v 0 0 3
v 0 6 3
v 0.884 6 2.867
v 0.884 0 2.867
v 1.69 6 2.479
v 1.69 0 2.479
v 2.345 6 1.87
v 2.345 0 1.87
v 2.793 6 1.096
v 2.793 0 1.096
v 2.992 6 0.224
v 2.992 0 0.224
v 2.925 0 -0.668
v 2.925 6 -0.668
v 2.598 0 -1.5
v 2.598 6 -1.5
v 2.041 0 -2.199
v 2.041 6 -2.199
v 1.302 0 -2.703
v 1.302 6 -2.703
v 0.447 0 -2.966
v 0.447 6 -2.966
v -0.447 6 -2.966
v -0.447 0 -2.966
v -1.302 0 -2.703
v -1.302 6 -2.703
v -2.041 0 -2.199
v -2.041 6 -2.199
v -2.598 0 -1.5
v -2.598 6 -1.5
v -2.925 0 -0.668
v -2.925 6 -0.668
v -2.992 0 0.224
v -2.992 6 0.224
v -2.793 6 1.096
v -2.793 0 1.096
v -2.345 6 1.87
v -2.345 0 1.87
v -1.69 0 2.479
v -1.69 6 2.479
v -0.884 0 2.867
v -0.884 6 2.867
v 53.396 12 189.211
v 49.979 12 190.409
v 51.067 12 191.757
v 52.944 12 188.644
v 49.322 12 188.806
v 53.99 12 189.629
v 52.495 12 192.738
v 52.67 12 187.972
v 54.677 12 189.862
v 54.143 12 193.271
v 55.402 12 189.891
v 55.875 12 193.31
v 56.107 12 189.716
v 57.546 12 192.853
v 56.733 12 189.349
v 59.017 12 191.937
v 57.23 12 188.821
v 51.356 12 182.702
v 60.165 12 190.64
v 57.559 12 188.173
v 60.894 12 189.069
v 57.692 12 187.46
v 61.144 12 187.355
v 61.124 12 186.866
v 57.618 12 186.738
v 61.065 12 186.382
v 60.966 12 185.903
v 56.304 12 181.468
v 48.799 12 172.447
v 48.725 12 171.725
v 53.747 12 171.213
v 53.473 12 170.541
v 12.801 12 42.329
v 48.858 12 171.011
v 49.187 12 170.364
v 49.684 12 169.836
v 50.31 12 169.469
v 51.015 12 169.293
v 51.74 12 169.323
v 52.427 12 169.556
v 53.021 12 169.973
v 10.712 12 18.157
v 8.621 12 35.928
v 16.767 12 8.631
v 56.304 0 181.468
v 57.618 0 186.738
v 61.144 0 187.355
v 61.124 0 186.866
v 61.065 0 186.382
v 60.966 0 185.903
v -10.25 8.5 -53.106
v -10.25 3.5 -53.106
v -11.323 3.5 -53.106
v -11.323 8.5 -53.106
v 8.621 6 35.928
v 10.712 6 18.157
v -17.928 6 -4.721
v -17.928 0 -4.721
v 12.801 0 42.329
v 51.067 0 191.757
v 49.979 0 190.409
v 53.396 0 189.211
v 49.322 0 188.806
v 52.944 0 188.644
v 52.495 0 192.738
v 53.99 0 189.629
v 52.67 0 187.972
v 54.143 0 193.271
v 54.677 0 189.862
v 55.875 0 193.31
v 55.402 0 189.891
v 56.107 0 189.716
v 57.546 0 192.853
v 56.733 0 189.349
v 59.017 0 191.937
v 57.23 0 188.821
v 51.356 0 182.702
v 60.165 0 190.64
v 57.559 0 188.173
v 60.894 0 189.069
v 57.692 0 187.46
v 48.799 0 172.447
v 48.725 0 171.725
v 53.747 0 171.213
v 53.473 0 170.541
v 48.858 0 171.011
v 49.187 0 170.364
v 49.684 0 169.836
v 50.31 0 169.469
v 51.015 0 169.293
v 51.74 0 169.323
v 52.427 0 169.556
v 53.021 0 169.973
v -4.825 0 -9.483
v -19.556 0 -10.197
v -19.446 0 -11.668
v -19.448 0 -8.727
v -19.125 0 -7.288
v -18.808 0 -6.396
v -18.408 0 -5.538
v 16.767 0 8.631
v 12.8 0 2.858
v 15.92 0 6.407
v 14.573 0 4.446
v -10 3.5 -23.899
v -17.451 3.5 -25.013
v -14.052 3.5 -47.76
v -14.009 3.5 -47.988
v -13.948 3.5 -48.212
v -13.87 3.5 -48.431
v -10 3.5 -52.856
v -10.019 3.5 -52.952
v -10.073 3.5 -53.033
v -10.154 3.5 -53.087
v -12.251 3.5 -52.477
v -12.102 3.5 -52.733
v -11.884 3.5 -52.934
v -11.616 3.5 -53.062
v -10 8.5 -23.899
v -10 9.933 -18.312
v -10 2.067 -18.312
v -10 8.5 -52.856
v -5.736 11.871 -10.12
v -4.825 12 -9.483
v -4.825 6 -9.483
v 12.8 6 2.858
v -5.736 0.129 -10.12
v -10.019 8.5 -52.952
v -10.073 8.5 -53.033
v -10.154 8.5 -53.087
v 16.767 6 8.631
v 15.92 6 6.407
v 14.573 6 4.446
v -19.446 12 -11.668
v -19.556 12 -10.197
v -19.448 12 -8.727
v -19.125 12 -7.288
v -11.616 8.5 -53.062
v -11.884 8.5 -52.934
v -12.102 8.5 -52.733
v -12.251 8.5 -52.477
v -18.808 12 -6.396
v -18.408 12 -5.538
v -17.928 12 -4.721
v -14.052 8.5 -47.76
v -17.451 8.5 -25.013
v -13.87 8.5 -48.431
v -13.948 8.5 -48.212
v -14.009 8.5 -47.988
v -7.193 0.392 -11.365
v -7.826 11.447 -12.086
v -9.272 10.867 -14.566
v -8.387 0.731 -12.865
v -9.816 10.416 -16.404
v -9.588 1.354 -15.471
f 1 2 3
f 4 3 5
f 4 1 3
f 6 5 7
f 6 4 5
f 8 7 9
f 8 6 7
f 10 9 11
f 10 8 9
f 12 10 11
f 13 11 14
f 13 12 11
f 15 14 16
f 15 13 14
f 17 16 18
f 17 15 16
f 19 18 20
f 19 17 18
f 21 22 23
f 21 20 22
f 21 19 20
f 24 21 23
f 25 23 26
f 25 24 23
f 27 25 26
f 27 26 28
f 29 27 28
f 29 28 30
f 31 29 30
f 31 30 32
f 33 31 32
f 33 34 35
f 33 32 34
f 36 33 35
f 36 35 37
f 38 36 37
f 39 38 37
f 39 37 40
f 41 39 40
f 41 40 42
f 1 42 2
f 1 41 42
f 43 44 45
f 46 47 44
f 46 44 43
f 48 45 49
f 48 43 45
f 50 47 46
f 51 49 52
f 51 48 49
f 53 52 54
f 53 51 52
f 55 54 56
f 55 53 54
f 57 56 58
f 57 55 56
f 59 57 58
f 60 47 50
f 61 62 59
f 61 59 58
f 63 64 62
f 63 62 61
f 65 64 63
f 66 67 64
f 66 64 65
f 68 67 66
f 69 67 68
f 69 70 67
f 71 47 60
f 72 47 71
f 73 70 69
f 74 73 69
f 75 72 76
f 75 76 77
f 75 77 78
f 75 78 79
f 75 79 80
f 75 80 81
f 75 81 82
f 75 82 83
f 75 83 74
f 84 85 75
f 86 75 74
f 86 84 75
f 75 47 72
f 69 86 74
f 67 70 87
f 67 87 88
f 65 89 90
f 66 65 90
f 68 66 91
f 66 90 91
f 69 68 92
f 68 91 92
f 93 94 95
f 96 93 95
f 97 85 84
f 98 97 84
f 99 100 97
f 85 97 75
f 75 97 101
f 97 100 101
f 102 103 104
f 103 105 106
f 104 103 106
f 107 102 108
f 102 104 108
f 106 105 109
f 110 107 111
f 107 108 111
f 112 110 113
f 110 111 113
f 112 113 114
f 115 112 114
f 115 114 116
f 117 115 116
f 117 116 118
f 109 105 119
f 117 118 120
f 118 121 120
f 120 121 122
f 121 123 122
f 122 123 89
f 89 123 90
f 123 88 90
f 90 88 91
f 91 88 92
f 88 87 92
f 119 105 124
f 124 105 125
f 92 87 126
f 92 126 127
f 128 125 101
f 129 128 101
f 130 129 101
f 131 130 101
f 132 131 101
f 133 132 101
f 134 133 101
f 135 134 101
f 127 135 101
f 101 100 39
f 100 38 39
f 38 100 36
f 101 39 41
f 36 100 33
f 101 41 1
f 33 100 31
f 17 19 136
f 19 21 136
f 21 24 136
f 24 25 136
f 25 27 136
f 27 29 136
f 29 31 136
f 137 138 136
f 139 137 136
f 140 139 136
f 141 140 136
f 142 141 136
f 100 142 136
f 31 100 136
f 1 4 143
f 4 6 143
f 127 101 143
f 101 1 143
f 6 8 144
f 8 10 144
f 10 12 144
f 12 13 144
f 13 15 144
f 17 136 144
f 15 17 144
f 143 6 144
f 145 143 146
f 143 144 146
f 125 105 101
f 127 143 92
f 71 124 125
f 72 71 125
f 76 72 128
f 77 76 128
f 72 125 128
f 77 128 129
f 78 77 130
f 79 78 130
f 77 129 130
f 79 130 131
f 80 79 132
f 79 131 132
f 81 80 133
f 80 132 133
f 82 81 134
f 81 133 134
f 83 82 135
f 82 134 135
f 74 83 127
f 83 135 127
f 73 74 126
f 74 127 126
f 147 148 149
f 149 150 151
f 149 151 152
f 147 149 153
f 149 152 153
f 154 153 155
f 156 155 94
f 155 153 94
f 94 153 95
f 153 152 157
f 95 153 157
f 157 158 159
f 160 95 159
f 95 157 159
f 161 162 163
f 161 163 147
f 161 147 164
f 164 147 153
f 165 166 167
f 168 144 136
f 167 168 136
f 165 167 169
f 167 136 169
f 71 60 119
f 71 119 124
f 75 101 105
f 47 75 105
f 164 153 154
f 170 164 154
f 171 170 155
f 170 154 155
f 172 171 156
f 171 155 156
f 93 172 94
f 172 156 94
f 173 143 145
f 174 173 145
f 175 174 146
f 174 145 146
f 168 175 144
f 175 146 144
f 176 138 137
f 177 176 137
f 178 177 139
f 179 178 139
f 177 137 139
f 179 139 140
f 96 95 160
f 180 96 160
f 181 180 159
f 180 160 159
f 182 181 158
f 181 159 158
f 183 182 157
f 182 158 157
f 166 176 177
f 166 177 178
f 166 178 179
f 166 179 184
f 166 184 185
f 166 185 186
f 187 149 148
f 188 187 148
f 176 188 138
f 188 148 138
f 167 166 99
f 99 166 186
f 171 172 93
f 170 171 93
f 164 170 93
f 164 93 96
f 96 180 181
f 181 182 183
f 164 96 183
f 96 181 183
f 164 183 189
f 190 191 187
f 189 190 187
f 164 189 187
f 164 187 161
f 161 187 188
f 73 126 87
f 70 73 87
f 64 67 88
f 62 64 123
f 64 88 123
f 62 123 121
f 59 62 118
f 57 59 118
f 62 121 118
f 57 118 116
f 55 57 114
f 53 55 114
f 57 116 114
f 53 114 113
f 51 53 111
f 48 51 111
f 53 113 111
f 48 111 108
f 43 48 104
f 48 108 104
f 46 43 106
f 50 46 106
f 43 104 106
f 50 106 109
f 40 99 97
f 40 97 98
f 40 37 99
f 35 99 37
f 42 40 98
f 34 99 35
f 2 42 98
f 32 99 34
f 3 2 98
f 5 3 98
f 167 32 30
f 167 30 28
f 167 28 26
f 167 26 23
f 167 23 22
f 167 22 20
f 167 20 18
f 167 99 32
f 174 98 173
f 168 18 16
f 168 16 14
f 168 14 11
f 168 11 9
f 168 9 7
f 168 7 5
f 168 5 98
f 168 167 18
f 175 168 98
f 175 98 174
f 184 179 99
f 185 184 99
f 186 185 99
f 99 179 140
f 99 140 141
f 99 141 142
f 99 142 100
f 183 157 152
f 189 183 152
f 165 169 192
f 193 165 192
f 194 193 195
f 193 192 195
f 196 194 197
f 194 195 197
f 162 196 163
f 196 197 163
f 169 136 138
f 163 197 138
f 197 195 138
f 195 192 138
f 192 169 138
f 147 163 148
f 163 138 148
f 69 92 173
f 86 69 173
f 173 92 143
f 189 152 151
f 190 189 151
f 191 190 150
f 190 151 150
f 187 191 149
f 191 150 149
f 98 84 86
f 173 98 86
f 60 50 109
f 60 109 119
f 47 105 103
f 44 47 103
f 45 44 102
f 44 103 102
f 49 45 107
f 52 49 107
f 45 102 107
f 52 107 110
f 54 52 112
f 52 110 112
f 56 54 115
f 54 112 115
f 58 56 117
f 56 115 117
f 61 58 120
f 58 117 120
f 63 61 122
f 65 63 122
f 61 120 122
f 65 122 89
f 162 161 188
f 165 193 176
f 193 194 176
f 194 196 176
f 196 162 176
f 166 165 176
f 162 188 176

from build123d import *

# Parameters (mm, degrees)
SKETCH1_R           = 3
BOSS_EXTRUDE2_DEPTH = 12
SKETCH3_W           = 12.000133412
SKETCH3_H           = 3.5
CUT_EXTRUDE1_DEPTH  = 214.167200314
CUT_EXTRUDE4_DEPTH  = 6


with BuildPart() as part:
    # Sketch1 → Boss-Extrude2 (new body)
    # profile 1 of 5: a face of its own
    with BuildSketch(Plane(origin=(0, 0, 0), x_dir=(1, 0, 0), z_dir=(0, 1, 0))):
        with BuildLine():
            Line((-19.125338302, 7.287833106), (4.566615153, -9.301451298))
            Line((4.566615153, -9.301451298), (12.801336755, -42.329115693))
            Line((12.801336755, -42.329115693), (49.322165839, -188.806160659))
            ThreePointArc((49.322165839, -188.806160659), (49.451500057, -185.458284048), (51.355769549, -182.701698688))
            Line((51.355769549, -182.701698688), (48.798935765, -172.446798499))
            ThreePointArc((48.798935765, -172.446798499), (50.656289033, -169.355643563), (53.747443969, -171.212996831))
            Line((53.747443969, -171.212996831), (56.304277753, -181.467897021))
            ThreePointArc((56.304277753, -181.467897021), (59.279786353, -183.007817055), (60.965714554, -185.903097912))
            Line((60.965714554, -185.903097912), (16.76676248, -8.630783649))
            ThreePointArc((16.76676248, -8.630783649), (15.305067103, -5.385940236), (12.79956958, -2.858482162))
            Line((12.79956958, -2.858482162), (-5.735764364, 10.120098389))
            ThreePointArc((-5.735764364, 10.120098389), (-8.870108332, 13.694132699), (-10, 18.311618831))
            Line((-10, 18.311618831), (-10, 52.855948326))
            ThreePointArc((-10, 52.855948326), (-10.073223305, 53.032725021), (-10.25, 53.105948326))
            Line((-10.25, 53.105948326), (-11.322967039, 53.105948326))
            ThreePointArc((-11.322967039, 53.105948326), (-11.883595848, 52.934015556), (-12.251443729, 52.477339002))
            Line((-12.251443729, 52.477339002), (-13.870086592, 48.430731845))
            ThreePointArc((-13.870086592, 48.430731845), (-13.980381666, 48.100636263), (-14.05170411, 47.759988049))
            Line((-14.05170411, 47.759988049), (-19.445744306, 11.667622342))
            ThreePointArc((-19.445744306, 11.667622342), (-19.528933908, 9.459922198), (-19.125338302, 7.287833106))
        make_face()
        with Locations(Location((0, 0, 0), (0, 0, 270))):
            Circle(SKETCH1_R, mode=Mode.SUBTRACT)
    # profile 2 of 5: a face of its own
    with BuildSketch(Plane(origin=(0, 0, 0), x_dir=(1, 0, 0), z_dir=(0, 1, 0))):
        with BuildLine():
            ThreePointArc((51.355769549, -182.701698688), (49.451500057, -185.458284048), (49.322165839, -188.806160659))
            Line((49.322165839, -188.806160659), (52.669686095, -187.971530119))
            Line((52.669686095, -187.971530119), (51.355769549, -182.701698688))
        make_face()
    # profile 3 of 5: a face of its own
    with BuildSketch(Plane(origin=(0, 0, 0), x_dir=(1, 0, 0), z_dir=(0, 1, 0))):
        with BuildLine():
            Line((56.304277753, -181.467897021), (57.618194299, -186.737728452))
            Line((57.618194299, -186.737728452), (60.965714554, -185.903097912))
            ThreePointArc((60.965714554, -185.903097912), (59.279786353, -183.007817055), (56.304277753, -181.467897021))
        make_face()
    # profile 4 of 5: a face of its own
    with BuildSketch(Plane(origin=(0, 0, 0), x_dir=(1, 0, 0), z_dir=(0, 1, 0))):
        with BuildLine():
            Line((52.669686095, -187.971530119), (49.322165839, -188.806160659))
            ThreePointArc((49.322165839, -188.806160659), (55.875156257, -193.309906195), (61.143940197, -187.354629285))
            ThreePointArc((61.143940197, -187.354629285), (61.099217106, -186.623413225), (60.965714554, -185.903097912))
            Line((60.965714554, -185.903097912), (57.618194299, -186.737728452))
            ThreePointArc((57.618194299, -186.737728452), (55.76084103, -189.828883387), (52.669686095, -187.971530119))
        make_face()
    # profile 5 of 5: a face of its own
    with BuildSketch(Plane(origin=(0, 0, 0), x_dir=(1, 0, 0), z_dir=(0, 1, 0))):
        with BuildLine():
            Line((12.801336755, -42.329115693), (4.566615153, -9.301451298))
            Line((4.566615153, -9.301451298), (-19.125338302, 7.287833106))
            ThreePointArc((-19.125338302, 7.287833106), (-18.618024546, 5.961975552), (-17.928078586, 4.721314409))
            Line((-17.928078586, 4.721314409), (12.801336755, -42.329115693))
        make_face()
    extrude(amount=BOSS_EXTRUDE2_DEPTH)

    # Sketch3 → Cut-Extrude1 (cut, through all)
    with BuildSketch(Plane(origin=(-20.726542351, 0, -3.097602509), x_dir=(-0.14780941112960405, 0, 0.9890158633619178), z_dir=(-0.9890158633619179, 0, -0.14780941112960405))):
        Polygon((-45.158411705, 0), (-8.665199569, 0), (-22.158545117, 3.5), (-45.158411705, 3.5), align=None)
        Polygon((-22.158545117, 8.5), (-8.665199569, 12), (-45.158411705, 12), (-45.158411705, 8.5), align=None)
        with Locations((-51.158478411, 10.25)):
            Rectangle(SKETCH3_W, SKETCH3_H)
        with Locations((-51.158478411, 1.75)):
            Rectangle(SKETCH3_W, SKETCH3_H)
    extrude(amount=-CUT_EXTRUDE1_DEPTH, mode=Mode.SUBTRACT)

    # Sketch4 → Cut-Extrude4 (cut)
    with BuildSketch(Plane(origin=(0, 12, 0), x_dir=(1, 0, 0), z_dir=(0, 1, 0))):
        Polygon((-4.825296228, 9.482581737), (-17.928078586, 4.721314409), (8.620757021, -35.928145405), (10.712004266, -18.156650248), (16.76676248, -8.630783649), (17.432158169, -2.976226879), align=None)
    extrude(amount=-CUT_EXTRUDE4_DEPTH, mode=Mode.SUBTRACT)


solid = part.part
